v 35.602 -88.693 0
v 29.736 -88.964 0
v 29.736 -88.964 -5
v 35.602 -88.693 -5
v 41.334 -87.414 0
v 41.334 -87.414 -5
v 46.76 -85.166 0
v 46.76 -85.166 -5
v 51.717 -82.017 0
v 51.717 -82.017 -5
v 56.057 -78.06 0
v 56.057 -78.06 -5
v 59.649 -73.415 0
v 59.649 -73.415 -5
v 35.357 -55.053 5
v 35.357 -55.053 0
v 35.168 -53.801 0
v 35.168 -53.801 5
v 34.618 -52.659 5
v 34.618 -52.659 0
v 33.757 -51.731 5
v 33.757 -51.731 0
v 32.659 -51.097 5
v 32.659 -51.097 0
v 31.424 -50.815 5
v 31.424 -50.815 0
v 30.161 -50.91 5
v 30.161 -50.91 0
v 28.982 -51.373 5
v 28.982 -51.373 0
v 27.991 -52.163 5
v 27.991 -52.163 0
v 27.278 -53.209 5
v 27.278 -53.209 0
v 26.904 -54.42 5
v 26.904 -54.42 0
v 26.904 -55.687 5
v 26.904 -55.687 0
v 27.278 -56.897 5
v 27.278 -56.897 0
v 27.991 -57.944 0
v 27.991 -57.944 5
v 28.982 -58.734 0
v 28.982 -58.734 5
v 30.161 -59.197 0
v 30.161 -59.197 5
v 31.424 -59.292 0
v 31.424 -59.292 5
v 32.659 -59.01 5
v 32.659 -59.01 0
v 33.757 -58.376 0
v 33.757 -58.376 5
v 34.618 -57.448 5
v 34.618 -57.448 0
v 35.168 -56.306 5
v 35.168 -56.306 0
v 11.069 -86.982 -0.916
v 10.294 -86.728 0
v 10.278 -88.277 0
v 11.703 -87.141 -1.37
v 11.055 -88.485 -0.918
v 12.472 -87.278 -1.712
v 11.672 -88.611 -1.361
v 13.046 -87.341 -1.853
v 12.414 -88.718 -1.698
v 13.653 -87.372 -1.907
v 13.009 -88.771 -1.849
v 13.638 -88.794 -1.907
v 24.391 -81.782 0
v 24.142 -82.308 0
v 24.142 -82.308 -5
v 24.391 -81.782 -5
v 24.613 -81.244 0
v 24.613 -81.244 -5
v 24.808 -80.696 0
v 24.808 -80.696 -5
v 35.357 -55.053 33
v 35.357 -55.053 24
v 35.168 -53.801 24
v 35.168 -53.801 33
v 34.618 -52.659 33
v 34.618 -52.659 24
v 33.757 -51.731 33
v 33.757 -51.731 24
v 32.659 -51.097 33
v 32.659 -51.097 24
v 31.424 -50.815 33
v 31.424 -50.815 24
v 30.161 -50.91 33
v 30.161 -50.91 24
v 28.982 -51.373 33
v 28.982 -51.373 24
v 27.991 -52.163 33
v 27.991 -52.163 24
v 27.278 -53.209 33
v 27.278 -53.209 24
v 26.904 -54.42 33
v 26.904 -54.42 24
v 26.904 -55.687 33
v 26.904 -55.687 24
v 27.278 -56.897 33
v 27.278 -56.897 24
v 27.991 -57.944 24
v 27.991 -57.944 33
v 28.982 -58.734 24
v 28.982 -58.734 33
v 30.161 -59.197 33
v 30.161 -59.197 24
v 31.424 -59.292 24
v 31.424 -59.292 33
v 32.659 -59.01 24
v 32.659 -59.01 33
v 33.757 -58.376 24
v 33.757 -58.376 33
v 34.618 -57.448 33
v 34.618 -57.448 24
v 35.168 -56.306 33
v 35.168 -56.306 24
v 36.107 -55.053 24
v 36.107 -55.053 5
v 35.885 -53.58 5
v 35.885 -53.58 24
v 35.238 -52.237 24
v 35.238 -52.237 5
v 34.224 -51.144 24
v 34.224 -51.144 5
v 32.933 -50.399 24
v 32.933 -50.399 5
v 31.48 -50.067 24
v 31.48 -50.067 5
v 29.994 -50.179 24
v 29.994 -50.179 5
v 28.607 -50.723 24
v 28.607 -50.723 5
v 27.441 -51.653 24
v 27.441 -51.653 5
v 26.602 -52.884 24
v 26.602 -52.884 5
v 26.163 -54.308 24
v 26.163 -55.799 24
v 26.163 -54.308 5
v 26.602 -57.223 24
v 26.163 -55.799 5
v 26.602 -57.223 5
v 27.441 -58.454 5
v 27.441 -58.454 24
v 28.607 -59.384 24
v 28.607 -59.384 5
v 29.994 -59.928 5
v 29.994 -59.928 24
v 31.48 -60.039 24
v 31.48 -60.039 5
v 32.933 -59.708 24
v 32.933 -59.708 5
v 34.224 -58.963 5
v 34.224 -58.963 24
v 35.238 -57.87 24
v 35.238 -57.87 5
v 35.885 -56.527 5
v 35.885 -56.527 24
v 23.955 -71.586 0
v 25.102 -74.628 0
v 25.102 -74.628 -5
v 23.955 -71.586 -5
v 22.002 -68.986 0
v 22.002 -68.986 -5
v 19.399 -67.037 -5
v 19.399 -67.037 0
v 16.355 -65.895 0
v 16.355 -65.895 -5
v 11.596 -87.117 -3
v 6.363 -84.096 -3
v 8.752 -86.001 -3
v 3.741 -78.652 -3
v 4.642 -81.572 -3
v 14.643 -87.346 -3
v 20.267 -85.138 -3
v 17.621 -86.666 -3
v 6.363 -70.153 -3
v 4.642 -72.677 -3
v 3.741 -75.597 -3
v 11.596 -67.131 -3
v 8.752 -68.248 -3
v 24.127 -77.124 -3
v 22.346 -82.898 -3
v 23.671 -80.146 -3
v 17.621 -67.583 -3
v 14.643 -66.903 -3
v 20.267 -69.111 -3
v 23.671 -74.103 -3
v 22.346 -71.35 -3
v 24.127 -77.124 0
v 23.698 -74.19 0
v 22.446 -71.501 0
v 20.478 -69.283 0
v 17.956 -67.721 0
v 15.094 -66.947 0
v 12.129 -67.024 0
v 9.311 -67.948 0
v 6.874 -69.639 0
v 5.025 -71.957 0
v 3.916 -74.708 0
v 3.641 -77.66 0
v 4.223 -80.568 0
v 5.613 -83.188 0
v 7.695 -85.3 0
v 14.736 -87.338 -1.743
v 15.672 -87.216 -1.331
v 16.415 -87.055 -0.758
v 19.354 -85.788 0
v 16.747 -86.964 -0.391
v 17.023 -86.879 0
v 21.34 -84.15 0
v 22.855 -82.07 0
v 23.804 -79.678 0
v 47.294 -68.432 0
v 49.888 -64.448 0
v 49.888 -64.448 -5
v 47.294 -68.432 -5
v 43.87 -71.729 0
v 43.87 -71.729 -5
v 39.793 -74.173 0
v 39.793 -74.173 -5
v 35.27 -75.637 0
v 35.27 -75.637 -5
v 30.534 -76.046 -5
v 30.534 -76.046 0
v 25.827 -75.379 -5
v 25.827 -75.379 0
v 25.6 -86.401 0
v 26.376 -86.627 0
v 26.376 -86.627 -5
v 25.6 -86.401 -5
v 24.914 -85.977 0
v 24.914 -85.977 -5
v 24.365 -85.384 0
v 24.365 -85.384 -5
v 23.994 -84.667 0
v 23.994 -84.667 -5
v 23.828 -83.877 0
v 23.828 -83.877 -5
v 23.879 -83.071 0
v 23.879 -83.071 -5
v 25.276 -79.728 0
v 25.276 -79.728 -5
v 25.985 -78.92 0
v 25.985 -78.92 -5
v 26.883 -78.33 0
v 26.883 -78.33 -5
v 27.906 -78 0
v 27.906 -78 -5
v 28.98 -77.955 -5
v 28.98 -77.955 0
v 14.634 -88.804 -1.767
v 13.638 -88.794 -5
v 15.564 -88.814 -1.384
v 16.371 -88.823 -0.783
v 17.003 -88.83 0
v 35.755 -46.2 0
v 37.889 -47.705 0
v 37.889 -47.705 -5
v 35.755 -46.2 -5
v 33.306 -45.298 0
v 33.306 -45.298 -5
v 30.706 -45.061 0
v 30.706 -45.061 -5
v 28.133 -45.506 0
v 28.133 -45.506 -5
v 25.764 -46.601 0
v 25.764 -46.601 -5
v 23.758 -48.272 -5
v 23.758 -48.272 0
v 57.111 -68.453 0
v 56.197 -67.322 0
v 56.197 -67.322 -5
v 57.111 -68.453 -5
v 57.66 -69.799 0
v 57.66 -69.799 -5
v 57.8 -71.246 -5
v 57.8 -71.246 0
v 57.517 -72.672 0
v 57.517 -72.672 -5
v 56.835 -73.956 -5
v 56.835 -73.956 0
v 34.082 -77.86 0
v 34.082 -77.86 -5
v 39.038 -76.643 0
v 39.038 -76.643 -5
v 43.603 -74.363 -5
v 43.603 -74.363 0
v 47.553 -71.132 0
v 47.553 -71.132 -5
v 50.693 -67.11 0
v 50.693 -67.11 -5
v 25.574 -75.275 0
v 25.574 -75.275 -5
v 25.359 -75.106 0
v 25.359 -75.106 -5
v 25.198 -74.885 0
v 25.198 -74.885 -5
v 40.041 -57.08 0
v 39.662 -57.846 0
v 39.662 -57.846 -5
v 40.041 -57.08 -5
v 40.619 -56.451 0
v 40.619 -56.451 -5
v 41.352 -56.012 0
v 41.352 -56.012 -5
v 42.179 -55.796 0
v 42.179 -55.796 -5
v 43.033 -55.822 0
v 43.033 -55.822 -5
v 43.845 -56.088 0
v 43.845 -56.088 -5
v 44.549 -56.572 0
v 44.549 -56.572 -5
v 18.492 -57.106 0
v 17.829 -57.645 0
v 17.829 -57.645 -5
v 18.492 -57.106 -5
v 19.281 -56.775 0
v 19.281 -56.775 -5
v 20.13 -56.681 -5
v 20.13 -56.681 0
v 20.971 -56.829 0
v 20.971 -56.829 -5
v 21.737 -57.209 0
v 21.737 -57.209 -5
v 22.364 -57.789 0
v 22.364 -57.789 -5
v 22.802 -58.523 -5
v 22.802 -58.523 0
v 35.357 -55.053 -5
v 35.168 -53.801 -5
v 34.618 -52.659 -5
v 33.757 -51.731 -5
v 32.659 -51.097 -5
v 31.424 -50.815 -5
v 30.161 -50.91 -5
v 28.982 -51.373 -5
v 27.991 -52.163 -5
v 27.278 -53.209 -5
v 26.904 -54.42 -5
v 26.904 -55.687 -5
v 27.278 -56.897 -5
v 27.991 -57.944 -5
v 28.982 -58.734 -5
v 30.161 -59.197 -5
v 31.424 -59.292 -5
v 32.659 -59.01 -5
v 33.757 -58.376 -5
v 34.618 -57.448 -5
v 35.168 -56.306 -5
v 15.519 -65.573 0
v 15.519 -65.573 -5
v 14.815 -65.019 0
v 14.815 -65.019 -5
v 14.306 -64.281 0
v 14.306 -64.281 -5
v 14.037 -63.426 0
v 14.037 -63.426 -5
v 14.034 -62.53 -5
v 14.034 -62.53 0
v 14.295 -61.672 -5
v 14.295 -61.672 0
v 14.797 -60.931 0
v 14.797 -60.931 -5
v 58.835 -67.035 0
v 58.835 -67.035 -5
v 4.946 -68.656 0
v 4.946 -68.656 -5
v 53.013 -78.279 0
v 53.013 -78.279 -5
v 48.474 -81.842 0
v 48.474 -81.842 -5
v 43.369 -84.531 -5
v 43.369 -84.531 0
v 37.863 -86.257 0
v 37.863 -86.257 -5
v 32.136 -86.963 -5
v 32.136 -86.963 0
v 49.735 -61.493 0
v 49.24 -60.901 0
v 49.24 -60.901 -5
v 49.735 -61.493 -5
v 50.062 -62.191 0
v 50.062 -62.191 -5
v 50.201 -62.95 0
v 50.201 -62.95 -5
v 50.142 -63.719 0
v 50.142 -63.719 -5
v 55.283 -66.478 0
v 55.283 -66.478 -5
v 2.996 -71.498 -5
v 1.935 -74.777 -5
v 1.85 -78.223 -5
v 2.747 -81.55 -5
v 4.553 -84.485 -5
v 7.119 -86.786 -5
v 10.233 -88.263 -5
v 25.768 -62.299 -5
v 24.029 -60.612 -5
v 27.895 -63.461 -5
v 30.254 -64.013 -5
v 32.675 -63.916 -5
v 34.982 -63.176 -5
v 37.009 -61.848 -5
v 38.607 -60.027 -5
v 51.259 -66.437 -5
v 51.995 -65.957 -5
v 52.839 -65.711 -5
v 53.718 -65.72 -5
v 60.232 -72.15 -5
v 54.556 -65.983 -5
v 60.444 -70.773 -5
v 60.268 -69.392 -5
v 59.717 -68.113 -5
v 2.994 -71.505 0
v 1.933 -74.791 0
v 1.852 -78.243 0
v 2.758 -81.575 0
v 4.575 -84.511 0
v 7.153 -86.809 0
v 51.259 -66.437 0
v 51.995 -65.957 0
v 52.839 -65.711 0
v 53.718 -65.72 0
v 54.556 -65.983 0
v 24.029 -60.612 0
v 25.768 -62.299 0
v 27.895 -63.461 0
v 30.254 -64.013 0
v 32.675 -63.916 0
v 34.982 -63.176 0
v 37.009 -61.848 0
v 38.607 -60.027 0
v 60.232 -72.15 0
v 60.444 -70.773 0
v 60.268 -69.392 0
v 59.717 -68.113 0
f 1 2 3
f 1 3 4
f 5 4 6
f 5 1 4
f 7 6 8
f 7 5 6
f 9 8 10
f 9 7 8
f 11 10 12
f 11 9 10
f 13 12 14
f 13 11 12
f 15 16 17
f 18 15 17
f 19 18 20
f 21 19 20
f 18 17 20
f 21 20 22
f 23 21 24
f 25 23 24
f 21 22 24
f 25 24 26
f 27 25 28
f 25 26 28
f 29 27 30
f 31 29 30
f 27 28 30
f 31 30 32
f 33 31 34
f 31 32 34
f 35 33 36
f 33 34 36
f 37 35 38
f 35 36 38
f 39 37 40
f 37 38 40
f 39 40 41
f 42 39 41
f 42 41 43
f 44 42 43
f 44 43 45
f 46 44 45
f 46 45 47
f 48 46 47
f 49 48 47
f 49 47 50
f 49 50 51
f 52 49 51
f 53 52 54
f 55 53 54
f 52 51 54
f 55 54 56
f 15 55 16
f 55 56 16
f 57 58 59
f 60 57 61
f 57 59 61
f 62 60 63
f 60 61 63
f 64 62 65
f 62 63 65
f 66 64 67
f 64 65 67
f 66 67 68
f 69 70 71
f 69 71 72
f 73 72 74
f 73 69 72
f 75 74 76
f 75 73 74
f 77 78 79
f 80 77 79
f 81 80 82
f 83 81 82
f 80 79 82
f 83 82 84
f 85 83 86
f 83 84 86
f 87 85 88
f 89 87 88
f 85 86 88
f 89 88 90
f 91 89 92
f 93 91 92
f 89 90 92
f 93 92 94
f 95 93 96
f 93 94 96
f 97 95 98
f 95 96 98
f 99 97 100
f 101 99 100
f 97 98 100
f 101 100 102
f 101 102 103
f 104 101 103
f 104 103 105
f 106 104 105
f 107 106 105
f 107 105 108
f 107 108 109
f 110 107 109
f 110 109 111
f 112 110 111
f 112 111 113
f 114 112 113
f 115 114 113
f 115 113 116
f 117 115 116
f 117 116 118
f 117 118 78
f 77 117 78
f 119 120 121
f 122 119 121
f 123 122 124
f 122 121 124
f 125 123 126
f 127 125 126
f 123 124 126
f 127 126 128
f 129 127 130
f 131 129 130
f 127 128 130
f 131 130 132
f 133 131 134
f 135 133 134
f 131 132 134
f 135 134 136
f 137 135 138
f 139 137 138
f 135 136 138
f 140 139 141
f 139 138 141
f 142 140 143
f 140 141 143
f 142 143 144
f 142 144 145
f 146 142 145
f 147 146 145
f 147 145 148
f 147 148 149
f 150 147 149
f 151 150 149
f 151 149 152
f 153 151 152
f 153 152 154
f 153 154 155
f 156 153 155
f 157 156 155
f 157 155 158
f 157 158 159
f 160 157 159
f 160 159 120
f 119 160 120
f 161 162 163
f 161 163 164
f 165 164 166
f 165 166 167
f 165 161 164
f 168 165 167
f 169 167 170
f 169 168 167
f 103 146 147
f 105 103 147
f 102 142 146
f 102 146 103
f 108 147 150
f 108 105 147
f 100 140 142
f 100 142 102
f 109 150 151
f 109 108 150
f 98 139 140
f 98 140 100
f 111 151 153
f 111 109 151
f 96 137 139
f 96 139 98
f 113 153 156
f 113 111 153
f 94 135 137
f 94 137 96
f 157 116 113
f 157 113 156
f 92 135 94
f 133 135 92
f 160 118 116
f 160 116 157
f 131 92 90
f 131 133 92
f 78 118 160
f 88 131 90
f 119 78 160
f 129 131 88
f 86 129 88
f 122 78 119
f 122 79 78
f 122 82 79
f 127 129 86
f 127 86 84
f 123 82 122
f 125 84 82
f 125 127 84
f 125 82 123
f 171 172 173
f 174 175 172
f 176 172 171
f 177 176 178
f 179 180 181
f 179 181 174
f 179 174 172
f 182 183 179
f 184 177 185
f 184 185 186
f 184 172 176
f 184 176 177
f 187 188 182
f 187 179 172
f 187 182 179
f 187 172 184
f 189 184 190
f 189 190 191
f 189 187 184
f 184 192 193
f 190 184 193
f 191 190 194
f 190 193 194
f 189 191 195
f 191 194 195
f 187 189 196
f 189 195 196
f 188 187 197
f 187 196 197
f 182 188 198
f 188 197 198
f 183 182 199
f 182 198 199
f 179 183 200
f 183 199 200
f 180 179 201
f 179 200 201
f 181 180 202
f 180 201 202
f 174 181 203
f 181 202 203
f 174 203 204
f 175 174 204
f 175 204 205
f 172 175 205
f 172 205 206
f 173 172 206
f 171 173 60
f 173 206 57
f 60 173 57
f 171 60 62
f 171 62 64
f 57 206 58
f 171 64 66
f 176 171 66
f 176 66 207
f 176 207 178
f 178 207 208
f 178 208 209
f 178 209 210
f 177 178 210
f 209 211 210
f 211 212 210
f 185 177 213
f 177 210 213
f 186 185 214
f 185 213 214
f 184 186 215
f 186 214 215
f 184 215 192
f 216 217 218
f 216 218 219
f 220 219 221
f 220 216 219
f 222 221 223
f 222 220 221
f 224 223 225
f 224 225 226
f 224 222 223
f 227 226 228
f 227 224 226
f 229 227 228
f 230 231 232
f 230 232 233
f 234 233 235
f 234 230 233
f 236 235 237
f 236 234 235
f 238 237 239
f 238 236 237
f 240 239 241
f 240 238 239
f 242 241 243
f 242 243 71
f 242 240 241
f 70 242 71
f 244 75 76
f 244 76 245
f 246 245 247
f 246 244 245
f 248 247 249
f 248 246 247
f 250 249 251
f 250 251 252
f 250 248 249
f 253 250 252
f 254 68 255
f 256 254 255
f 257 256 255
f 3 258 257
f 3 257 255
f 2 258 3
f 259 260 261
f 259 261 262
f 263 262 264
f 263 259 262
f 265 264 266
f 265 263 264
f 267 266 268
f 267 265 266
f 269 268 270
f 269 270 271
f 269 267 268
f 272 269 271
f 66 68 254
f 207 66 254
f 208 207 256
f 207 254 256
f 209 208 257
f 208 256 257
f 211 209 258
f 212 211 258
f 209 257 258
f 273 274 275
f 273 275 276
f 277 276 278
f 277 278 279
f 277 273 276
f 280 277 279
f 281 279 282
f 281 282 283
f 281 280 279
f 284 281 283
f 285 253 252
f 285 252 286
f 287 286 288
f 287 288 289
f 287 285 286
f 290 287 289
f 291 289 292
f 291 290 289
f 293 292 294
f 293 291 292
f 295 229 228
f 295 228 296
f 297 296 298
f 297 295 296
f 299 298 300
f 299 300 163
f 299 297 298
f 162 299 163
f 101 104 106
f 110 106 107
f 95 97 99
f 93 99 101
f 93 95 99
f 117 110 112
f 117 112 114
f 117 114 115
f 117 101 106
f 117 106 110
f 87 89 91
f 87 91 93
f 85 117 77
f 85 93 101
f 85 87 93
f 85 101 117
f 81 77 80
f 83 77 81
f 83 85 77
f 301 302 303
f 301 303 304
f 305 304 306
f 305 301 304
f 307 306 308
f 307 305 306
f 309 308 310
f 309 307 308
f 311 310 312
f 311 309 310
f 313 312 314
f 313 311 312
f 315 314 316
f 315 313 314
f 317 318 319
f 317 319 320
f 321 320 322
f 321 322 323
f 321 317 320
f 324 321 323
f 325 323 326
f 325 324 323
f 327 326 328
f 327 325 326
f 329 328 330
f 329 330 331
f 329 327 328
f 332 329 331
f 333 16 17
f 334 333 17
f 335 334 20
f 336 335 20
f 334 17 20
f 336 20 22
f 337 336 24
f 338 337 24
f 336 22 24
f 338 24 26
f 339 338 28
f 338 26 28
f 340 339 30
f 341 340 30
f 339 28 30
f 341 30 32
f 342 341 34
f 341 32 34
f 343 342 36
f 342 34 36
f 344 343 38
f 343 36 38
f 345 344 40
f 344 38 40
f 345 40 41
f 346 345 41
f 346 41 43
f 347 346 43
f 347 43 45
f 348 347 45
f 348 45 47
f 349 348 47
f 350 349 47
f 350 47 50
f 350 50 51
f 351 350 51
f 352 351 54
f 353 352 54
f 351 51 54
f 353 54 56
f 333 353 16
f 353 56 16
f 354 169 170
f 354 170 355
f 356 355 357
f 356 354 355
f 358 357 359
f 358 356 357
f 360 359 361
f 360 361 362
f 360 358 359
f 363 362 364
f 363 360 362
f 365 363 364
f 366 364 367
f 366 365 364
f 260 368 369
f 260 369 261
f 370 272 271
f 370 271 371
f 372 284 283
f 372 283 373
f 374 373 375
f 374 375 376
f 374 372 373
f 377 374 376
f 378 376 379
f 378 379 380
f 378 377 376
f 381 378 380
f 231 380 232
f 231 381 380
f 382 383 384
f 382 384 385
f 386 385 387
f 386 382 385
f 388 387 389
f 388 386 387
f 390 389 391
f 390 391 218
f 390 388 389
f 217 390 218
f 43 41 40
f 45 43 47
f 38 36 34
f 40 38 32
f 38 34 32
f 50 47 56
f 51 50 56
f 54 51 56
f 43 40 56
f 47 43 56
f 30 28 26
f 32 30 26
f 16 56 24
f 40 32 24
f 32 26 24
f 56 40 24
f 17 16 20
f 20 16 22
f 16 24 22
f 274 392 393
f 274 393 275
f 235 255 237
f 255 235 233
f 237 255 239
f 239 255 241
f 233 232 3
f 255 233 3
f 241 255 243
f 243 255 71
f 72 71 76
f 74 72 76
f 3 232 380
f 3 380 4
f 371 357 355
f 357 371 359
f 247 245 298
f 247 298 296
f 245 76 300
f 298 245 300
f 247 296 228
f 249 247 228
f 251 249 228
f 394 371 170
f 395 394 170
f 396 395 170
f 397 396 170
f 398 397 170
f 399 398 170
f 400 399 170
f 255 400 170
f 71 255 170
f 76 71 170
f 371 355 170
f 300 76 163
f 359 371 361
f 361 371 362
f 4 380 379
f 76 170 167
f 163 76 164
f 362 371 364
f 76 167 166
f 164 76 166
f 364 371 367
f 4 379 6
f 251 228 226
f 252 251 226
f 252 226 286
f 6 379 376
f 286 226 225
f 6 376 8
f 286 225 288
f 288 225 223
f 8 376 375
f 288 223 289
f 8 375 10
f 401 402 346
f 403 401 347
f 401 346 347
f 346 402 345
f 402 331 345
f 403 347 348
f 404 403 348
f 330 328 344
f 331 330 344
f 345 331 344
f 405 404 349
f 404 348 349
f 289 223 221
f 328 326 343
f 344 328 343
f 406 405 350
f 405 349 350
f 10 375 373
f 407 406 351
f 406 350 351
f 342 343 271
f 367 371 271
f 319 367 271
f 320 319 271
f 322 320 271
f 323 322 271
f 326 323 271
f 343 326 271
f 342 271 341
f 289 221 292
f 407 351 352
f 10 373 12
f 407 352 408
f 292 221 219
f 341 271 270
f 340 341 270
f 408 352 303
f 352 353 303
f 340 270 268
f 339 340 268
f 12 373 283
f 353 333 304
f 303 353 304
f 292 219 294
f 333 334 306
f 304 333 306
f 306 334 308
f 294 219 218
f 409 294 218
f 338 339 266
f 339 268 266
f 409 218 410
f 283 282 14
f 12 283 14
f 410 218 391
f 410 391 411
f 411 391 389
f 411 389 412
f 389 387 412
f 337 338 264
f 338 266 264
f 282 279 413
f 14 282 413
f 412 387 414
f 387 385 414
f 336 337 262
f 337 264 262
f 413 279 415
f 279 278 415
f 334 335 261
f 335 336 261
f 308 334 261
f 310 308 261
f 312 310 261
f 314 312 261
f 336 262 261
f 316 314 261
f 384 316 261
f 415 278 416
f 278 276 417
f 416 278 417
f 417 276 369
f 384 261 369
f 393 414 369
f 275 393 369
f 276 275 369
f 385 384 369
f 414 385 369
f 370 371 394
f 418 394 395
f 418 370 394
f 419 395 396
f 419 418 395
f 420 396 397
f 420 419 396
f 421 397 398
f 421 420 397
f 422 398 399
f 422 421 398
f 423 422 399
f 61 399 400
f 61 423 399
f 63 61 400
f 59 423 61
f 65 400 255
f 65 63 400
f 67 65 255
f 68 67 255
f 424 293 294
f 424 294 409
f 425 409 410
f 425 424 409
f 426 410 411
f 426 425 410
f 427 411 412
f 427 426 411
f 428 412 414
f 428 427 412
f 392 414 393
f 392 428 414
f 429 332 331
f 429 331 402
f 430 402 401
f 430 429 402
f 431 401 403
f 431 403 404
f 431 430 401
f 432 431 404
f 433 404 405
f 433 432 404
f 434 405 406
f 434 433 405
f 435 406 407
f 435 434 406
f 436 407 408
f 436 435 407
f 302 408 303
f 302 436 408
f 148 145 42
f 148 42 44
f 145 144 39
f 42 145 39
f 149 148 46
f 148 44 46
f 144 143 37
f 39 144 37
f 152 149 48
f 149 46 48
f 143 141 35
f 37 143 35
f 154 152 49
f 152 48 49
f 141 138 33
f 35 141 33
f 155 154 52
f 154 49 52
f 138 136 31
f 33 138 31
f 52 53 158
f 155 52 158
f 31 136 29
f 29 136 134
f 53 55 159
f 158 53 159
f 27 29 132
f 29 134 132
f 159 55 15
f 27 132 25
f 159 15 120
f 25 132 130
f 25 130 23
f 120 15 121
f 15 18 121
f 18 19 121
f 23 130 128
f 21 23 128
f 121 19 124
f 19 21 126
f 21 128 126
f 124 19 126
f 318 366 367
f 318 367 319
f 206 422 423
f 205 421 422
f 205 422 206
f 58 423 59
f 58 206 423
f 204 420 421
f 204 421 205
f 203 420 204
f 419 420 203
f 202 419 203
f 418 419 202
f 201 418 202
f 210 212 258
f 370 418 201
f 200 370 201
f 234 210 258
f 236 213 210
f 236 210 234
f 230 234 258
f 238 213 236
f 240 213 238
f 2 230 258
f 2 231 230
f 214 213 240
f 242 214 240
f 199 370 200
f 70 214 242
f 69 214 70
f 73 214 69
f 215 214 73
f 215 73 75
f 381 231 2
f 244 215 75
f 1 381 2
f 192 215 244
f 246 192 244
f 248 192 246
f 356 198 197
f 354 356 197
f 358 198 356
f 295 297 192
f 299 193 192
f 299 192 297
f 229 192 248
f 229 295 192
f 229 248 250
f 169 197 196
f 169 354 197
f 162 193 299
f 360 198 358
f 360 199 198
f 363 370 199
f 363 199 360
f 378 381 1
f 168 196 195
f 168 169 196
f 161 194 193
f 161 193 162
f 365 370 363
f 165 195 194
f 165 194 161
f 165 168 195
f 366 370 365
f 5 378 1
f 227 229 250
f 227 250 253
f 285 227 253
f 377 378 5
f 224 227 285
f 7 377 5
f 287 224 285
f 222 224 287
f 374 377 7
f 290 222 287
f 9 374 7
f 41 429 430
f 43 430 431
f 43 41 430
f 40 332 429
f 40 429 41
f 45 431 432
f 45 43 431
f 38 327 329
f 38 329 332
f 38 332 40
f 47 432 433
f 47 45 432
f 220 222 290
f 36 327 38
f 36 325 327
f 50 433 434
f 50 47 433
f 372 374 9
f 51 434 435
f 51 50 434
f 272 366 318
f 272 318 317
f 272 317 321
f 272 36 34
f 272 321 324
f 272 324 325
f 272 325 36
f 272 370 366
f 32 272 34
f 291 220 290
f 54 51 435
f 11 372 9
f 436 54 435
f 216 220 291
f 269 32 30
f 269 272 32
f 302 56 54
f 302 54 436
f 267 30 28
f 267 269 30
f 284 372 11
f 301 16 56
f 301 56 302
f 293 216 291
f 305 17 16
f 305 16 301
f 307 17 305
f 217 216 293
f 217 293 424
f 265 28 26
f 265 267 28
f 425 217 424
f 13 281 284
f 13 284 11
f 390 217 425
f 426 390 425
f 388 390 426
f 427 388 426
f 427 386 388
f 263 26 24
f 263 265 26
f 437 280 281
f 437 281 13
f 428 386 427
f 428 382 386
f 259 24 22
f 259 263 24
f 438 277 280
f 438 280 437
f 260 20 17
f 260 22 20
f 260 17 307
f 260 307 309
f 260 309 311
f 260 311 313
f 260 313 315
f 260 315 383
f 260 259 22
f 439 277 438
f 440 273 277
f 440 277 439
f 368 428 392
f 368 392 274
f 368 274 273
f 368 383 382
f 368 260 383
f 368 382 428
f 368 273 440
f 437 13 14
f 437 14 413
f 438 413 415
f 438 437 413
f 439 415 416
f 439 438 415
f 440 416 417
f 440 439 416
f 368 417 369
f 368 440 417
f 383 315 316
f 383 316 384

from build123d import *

# Parameters (mm, degrees)
F0_R     = 10.25
F0_R_2   = 5
F0_R_3   = 4.25
F1_DEPTH = 5
F2_DEPTH = 33
F3_DEPTH = 24
F4_DEPTH = 3
F5_DEPTH = 5
F7_DEPTH = 2.0316230768


# Not quite as in the source:
# - a feature names something its author has since deleted; it is built from what else it names


with BuildPart() as f1:
    # F0 (on Top) → F1 (new body)
    with BuildSketch(Plane.XY):
        with BuildLine():
            ThreePointArc((37.8886156331, -47.7045562268), (30.7058016888, -45.0614846038), (23.757851373, -48.271567184))
            Line((23.757851373, -48.271567184), (4.9458403192, -68.6563901516))
            ThreePointArc((4.9458403192, -68.6563901516), (2.7469798041, -81.5500736227), (13.6377095304, -88.793972231))
            Line((13.6377095304, -88.793972231), (29.73595993, -88.9640810988))
            ThreePointArc((29.73595993, -88.9640810988), (46.7599967293, -85.1663293947), (59.6493608288, -73.4145193188))
            ThreePointArc((59.6493608288, -73.4145193188), (60.4040648618, -70.0765035789), (58.8352277111, -67.0350109763))
            Line((58.8352277111, -67.0350109763), (37.8886156331, -47.7045562268))
        make_face()
        with Locations((13.8766520367, -77.1243319886)):
            Circle(F0_R, mode=Mode.SUBTRACT)
        with BuildLine():
            ThreePointArc((26.3755166306, -86.6270533164), (24.155278042, -85.0381292254), (24.1421413752, -82.307933887))
            ThreePointArc((24.1421413752, -82.307933887), (24.5057243444, -81.5144142062), (24.808075333, -80.6956041311))
            ThreePointArc((24.808075333, -80.6956041311), (26.4141385233, -78.5946086732), (28.9801509243, -77.9549202777))
            ThreePointArc((28.9801509243, -77.9549202777), (41.3836815678, -75.6297518396), (50.6933671902, -67.110143028))
            ThreePointArc((50.6933671902, -67.110143028), (52.8388421265, -65.7108085683), (55.2827077781, -66.4780896835))
            Line((55.2827077781, -66.4780896835), (56.196743854, -67.321602369))
            ThreePointArc((56.196743854, -67.321602369), (57.7828175357, -70.5171396289), (56.835176405, -73.9564803202))
            ThreePointArc((56.835176405, -73.9564803202), (43.3687378078, -84.5309041293), (26.3755166306, -86.6270533164))
        make_face(mode=Mode.SUBTRACT)
        with BuildLine():
            ThreePointArc((17.829474896, -57.6446324429), (20.5558252215, -56.7249026703), (22.8022906293, -58.5227575376))
            ThreePointArc((22.8022906293, -58.5227575376), (31.4675825452, -64.046207144), (39.6624601723, -57.8462264813))
            ThreePointArc((39.6624601723, -57.8462264813), (41.7576536692, -55.8741582362), (44.5489302313, -56.5724877473))
            Line((44.5489302313, -56.5724877473), (49.2396549007, -60.901294746))
            ThreePointArc((49.2396549007, -60.901294746), (50.1561683514, -62.5663798864), (49.8881507259, -64.4480472275))
            ThreePointArc((49.8881507259, -64.4480472275), (39.7927356809, -74.1728962685), (25.8272247035, -75.3789629921))
            ThreePointArc((25.8272247035, -75.3789629921), (25.3591431783, -75.10558707), (25.1024718967, -74.6281411964))
            ThreePointArc((25.1024718967, -74.6281411964), (22.0019832723, -68.9862122849), (16.3551853155, -65.8946003451))
            ThreePointArc((16.3551853155, -65.8946003451), (14.1394417768, -63.8635142203), (14.7970929317, -60.9305421383))
            Line((14.7970929317, -60.9305421383), (17.829474896, -57.6446324429))
        make_face(mode=Mode.SUBTRACT)
        with Locations((31.1067389816, -55.0534438355)):
            Circle(F0_R_2, mode=Mode.SUBTRACT)
        with Locations((13.8766520367, -77.1243319886)):
            Circle(F0_R)
        with Locations((31.1067389816, -55.0534438355)):
            Circle(F0_R_2)
        with Locations((31.1067389816, -55.0534438355)):
            Circle(F0_R_3, mode=Mode.SUBTRACT)
    extrude(amount=-F1_DEPTH)



with BuildPart() as f2:
    # F0 (on Top) → F2 (new body)
    with BuildSketch(Plane.XY):
        with Locations((31.1067389816, -55.0534438355)):
            Circle(F0_R_3)
    extrude(amount=F2_DEPTH)


with BuildPart() as f1_1:
    add(f1.part)

    add(f2.part)  # F3 merges F2
    # F0 (on Top) → F3 (join)
    with BuildSketch(Plane.XY):
        with Locations((31.1067389816, -55.0534438355)):
            Circle(F0_R_2)
        with Locations((31.1067389816, -55.0534438355)):
            Circle(F0_R_3, mode=Mode.SUBTRACT)
    extrude(amount=F3_DEPTH)

    # F0 (on Top) → F4 (cut)
    with BuildSketch(Plane.XY):
        with Locations((13.8766520367, -77.1243319886)):
            Circle(F0_R)
    extrude(amount=-F4_DEPTH, mode=Mode.SUBTRACT)

    # F0 (on Top) → F5 (cut)
    with BuildSketch(Plane.XY):
        with Locations((31.1067389816, -55.0534438355)):
            Circle(F0_R_2)
        with Locations((31.1067389816, -55.0534438355)):
            Circle(F0_R_3, mode=Mode.SUBTRACT)
    extrude(amount=F5_DEPTH, mode=Mode.SUBTRACT)

    # F6 (on face) → F7 (cut, through all)
    with BuildSketch(Plane(origin=(-0.9366511213, -88.639966179, 0), x_dir=(0.9999441748, -0.0105663266, 0), z_dir=(-0.0105663266, -0.9999441748, 0))):
        with BuildLine():
            Line((14.5751743135, -1.9074911252), (14.5751743135, 0))
            Line((14.5751743135, 0), (11.210032617, 0))
            ThreePointArc((11.210032617, 0), (12.6485346529, -1.384324833), (14.5751743135, -1.9074911252))
        make_face()
        with BuildLine():
            ThreePointArc((14.5751743135, -1.9074911252), (16.501813974, -1.384324833), (17.94031601, 0))
            Line((17.94031601, 0), (14.5751743135, 0))
            Line((14.5751743135, 0), (14.5751743135, -1.9074911252))
        make_face()
    extrude(amount=-F7_DEPTH, mode=Mode.SUBTRACT)


solid = f1_1.part
